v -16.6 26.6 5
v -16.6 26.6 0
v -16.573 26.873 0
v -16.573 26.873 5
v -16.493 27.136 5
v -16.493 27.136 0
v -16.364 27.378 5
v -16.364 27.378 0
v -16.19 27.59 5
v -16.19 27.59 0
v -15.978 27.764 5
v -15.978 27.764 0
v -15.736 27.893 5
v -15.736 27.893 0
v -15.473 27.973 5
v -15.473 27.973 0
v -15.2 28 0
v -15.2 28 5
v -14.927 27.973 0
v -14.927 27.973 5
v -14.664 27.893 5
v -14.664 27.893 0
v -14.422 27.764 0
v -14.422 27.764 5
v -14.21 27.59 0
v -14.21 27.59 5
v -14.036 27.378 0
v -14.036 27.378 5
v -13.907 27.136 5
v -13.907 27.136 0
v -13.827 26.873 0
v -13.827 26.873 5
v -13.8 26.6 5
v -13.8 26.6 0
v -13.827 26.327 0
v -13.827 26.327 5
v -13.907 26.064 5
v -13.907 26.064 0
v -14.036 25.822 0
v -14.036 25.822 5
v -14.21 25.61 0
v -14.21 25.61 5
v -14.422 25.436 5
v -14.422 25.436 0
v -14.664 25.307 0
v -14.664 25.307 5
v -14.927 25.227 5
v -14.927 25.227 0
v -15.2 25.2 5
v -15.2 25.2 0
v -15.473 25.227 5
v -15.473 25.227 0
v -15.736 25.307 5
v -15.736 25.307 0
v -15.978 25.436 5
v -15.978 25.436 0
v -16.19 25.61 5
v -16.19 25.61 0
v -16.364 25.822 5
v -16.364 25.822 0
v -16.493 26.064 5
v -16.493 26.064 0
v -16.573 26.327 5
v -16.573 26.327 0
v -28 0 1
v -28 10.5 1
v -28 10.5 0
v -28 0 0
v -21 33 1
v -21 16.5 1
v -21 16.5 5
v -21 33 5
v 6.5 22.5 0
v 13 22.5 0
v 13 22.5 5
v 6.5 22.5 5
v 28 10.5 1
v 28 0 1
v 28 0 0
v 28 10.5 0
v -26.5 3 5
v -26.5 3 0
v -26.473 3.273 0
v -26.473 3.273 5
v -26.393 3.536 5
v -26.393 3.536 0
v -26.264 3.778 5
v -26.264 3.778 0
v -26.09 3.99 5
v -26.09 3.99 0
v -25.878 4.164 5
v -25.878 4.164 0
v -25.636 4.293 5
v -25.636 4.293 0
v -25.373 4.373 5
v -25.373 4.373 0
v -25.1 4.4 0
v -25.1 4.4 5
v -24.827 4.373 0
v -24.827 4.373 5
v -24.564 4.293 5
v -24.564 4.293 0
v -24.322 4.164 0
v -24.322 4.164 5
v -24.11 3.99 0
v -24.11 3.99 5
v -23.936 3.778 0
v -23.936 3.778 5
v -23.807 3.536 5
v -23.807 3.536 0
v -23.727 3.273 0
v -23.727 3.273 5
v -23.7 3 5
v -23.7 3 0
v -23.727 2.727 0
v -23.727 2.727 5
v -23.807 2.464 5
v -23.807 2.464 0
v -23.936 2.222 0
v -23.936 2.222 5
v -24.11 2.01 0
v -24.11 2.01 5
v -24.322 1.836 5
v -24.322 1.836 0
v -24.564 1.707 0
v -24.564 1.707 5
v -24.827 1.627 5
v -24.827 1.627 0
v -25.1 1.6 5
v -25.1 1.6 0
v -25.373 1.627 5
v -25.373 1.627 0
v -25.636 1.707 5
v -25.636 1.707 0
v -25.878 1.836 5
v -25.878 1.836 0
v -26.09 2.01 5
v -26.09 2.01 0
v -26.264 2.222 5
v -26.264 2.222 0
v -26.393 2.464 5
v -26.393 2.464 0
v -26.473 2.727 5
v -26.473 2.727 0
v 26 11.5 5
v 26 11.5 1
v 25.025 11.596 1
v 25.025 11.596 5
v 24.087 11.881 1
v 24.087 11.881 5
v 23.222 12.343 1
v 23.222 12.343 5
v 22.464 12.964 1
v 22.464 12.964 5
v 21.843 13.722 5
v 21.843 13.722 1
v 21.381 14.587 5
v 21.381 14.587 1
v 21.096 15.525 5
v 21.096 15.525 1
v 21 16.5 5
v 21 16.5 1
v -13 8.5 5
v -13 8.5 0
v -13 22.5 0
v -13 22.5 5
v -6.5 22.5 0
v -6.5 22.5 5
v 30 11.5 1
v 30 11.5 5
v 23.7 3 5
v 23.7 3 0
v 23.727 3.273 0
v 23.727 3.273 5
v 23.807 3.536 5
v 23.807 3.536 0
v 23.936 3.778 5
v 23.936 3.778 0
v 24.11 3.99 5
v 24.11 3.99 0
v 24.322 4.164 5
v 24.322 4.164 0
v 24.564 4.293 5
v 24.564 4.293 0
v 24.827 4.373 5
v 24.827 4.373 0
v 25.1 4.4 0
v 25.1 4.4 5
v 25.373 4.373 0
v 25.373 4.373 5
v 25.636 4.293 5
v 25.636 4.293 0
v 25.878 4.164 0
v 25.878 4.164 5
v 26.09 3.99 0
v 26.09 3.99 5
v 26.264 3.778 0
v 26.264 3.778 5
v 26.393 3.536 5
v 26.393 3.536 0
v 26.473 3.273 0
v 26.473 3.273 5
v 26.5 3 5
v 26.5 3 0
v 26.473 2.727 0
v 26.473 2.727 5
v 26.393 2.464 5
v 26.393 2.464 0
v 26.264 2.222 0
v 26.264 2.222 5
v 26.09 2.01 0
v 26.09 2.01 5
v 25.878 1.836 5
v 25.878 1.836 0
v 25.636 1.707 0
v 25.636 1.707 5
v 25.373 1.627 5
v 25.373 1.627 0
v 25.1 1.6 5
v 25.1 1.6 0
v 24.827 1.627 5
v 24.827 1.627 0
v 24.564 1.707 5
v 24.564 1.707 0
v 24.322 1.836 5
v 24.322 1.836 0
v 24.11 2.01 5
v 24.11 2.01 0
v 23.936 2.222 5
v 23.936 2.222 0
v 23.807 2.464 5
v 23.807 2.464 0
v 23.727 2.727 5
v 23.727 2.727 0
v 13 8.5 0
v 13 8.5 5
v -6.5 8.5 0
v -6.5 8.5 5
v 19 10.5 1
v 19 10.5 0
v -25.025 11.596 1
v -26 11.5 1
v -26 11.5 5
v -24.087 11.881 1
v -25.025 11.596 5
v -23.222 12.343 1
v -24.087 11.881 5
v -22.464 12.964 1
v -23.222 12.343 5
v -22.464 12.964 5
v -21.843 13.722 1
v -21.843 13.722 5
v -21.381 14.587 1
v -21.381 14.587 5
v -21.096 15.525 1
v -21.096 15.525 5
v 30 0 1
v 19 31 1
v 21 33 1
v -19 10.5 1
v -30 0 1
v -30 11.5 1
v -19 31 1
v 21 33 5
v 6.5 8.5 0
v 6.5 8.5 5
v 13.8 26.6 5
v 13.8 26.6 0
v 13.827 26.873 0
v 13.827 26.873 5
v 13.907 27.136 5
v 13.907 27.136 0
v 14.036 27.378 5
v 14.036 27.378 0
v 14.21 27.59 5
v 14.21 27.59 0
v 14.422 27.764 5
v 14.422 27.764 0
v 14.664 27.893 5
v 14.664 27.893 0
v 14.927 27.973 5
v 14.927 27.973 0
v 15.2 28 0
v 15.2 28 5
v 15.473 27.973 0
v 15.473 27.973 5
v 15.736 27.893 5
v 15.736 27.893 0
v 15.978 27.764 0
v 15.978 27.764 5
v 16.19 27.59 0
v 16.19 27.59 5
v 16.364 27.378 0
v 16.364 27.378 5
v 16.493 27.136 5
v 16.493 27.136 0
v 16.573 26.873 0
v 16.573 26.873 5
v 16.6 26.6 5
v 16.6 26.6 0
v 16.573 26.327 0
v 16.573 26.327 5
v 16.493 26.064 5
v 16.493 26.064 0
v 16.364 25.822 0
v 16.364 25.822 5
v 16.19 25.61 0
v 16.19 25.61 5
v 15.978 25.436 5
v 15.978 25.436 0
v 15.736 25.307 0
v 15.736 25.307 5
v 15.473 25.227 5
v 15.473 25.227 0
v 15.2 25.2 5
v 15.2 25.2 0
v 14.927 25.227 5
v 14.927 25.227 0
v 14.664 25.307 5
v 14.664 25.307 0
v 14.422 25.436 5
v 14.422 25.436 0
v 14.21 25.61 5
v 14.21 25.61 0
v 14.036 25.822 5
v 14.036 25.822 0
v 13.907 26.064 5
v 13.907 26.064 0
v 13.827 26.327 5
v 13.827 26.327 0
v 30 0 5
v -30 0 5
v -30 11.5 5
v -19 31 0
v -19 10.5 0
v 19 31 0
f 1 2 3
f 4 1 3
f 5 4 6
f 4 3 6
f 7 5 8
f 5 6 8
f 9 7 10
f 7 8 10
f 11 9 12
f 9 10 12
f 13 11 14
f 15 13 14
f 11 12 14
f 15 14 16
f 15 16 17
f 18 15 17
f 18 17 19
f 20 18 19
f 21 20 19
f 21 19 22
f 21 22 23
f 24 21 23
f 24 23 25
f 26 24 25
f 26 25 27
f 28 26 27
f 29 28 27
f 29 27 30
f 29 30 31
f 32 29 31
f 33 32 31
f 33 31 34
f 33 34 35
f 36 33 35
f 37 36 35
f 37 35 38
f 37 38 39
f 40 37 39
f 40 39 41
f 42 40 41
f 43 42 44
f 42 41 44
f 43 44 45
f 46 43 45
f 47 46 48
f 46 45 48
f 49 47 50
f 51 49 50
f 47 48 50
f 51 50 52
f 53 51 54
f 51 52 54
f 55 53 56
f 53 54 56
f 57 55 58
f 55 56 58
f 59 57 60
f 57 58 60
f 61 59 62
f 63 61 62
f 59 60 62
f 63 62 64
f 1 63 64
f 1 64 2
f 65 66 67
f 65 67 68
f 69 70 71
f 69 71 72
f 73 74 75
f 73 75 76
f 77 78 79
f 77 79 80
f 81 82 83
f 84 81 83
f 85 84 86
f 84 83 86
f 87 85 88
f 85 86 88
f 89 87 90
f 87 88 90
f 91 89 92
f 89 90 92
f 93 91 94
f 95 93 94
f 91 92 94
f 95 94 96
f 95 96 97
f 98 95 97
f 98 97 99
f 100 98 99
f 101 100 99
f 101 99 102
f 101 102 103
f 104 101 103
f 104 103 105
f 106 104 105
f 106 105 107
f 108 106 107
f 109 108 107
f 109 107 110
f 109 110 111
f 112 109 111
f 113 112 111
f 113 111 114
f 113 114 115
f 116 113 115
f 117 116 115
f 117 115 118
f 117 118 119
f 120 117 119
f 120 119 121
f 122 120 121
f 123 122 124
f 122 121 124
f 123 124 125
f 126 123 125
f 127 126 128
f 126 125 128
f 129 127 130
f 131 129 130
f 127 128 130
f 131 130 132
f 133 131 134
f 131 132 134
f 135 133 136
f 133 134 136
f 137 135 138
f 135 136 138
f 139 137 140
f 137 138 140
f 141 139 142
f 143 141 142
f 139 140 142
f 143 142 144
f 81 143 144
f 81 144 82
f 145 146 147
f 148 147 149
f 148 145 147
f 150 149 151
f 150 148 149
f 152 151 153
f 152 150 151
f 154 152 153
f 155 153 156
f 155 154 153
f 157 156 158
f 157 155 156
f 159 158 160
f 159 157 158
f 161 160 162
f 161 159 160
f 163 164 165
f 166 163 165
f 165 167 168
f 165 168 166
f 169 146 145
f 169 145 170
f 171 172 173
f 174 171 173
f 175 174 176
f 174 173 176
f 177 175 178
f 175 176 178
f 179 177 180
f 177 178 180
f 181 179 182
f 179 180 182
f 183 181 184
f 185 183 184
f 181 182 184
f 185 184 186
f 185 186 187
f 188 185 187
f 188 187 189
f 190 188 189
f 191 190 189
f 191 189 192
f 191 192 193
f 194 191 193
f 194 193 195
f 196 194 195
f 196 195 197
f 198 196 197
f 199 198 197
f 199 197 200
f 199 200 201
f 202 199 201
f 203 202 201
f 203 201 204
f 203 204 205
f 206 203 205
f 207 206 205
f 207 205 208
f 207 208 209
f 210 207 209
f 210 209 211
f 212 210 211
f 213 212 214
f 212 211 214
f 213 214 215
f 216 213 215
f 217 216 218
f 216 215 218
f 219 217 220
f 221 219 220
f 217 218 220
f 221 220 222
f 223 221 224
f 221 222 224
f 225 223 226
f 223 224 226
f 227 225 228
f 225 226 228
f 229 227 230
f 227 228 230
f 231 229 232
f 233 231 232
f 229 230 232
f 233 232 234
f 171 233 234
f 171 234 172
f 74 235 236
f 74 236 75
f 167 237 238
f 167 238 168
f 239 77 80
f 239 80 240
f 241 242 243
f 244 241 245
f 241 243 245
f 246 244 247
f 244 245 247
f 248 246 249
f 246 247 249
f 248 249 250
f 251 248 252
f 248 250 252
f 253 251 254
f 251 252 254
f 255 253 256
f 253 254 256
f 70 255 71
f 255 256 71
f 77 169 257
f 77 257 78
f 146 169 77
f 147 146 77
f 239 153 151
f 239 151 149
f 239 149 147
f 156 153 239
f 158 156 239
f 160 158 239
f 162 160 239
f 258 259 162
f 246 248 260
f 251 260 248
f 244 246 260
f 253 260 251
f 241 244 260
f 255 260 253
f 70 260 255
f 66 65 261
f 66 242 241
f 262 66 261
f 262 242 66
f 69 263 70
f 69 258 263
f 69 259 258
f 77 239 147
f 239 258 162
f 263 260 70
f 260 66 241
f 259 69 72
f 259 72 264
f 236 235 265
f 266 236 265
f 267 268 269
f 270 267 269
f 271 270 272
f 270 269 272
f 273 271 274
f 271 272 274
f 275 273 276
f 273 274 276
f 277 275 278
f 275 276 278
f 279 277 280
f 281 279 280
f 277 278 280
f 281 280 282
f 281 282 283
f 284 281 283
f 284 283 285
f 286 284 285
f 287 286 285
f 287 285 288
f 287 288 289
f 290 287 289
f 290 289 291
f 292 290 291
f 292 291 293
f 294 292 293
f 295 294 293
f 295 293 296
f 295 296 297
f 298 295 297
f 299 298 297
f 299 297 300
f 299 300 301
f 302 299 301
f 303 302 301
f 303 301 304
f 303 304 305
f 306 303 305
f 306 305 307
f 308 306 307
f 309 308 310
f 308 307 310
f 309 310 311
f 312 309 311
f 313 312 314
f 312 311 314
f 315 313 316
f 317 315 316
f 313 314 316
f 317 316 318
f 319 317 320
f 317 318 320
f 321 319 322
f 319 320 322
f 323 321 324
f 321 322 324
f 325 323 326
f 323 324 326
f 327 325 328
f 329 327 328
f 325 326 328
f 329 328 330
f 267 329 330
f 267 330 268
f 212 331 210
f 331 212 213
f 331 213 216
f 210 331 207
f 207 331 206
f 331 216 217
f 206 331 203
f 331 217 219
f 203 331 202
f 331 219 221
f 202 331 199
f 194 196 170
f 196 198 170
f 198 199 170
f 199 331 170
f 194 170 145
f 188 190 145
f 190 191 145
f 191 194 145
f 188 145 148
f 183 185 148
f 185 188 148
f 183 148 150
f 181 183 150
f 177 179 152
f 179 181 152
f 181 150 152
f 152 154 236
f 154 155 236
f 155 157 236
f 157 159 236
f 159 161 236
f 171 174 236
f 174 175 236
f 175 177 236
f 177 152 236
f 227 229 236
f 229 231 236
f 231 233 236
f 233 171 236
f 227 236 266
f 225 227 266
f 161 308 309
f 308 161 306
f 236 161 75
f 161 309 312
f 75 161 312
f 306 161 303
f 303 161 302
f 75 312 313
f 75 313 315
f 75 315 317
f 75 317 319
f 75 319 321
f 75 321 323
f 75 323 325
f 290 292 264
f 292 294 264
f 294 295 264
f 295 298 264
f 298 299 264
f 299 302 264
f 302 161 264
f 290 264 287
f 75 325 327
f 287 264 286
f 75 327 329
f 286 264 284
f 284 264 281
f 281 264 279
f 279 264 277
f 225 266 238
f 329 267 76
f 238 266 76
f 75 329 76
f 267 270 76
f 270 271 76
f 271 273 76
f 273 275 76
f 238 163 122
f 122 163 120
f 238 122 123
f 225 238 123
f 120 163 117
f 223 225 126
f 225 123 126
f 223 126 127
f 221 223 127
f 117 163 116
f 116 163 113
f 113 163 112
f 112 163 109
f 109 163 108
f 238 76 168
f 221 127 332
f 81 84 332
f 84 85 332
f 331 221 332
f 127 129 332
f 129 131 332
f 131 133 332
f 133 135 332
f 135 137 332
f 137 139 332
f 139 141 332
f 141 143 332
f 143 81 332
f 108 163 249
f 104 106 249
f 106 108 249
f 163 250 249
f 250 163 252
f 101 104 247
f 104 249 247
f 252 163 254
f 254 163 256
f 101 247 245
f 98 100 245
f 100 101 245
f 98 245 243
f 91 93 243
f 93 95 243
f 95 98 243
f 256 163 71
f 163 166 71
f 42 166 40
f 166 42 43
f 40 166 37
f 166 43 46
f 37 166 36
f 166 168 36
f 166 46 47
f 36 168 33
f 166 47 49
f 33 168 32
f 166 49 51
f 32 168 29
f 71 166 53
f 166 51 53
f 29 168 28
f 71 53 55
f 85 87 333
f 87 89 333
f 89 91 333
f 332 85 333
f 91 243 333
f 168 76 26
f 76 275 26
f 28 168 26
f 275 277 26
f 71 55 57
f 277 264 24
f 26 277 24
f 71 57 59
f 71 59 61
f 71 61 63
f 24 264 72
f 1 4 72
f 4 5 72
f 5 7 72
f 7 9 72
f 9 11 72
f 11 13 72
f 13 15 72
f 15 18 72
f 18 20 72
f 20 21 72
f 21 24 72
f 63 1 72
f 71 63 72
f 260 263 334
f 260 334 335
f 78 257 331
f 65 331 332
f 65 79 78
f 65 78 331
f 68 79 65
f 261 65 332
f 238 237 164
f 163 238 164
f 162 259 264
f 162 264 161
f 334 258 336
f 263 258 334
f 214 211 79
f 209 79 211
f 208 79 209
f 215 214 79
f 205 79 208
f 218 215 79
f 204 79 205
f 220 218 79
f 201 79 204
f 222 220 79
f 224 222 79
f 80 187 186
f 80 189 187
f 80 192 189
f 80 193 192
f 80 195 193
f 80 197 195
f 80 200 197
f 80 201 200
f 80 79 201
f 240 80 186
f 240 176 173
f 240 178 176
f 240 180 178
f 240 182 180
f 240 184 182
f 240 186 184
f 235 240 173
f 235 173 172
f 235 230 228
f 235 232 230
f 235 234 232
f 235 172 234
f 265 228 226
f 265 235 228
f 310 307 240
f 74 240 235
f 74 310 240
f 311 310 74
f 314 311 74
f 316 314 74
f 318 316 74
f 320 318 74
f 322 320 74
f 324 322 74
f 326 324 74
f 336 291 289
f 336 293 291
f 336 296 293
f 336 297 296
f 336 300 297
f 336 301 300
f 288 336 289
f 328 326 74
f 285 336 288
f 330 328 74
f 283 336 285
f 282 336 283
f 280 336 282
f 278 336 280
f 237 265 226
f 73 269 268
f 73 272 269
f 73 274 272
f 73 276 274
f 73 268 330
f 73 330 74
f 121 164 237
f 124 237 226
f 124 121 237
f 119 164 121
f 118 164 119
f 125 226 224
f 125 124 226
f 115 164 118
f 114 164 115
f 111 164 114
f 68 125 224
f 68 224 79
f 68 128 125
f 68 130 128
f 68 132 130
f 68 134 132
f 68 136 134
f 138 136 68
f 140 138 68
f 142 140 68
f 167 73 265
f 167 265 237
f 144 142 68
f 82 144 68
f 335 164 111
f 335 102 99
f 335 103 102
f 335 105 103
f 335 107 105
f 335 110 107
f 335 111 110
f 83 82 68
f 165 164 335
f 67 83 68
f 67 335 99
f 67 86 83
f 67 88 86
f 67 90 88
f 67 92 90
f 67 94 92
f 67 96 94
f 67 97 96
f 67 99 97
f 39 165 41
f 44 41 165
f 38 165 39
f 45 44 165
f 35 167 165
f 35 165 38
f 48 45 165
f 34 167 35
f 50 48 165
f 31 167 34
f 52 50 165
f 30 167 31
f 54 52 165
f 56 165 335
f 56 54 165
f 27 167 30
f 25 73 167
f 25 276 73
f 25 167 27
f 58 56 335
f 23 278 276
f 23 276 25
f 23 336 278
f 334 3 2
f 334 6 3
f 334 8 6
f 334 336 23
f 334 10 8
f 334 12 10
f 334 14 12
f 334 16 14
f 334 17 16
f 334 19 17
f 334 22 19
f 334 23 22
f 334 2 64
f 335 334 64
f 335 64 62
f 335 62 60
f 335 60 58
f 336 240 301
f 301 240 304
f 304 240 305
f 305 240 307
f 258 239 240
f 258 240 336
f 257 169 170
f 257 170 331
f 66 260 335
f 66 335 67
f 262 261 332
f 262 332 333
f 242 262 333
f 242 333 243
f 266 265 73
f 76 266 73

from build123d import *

# Parameters (mm, degrees)
EXTRUDE_1_DEPTH     = 5
SKETCH_2_W          = 6.5
SKETCH_2_H          = 14
CUT_EXTRUDE_1_DEPTH = 5
SKETCH_3_R          = 1.4
CUT_EXTRUDE_2_DEPTH = 45.877611345
FILLET_1_R          = 5
CUT_EXTRUDE_START   = -1
CUT_EXTRUDE_5_DEPTH = 1


with BuildPart() as part:
    # 草图1 → 凸台-拉伸1 (new body)
    with BuildSketch(Plane.XY):
        Polygon((30, 0), (-30, 0), (-30, 11.5), (-21, 11.5), (-21, 33), (21, 33), (21, 11.5), (30, 11.5), align=None)
    extrude(amount=EXTRUDE_1_DEPTH)

    # 草图2 → 切除-拉伸1 (cut)
    with BuildSketch(Plane(origin=(0, 0, 0), x_dir=(-1, 0, 0), z_dir=(0, 0, -1))):
        with Locations((-9.75, 15.5)):
            Rectangle(SKETCH_2_W, SKETCH_2_H)
        with Locations((9.75, 15.5)):
            Rectangle(SKETCH_2_W, SKETCH_2_H)
    extrude(amount=-CUT_EXTRUDE_1_DEPTH, mode=Mode.SUBTRACT)

    # 草图3 → 切除-拉伸2 (cut, through all)
    with BuildSketch(Plane(origin=(0, 0, 0), x_dir=(-1, 0, 0), z_dir=(0, 0, -1))):
        with Locations((-25.1, 3)):
            Circle(SKETCH_3_R)
        with Locations((-15.2, 26.6)):
            Circle(SKETCH_3_R)
        with Locations((25.1, 3)):
            Circle(SKETCH_3_R)
        with Locations((15.2, 26.6)):
            Circle(SKETCH_3_R)
    extrude(amount=-CUT_EXTRUDE_2_DEPTH, mode=Mode.SUBTRACT)

    # 圆角1
    fillet_1_edges = [part.edges().sort_by_distance(p)[0] for p in [
        (-21, 11.5, 2.5),
        (21, 11.5, 2.5),
    ]]
    fillet(fillet_1_edges, radius=FILLET_1_R)

    # 草图5 → 切除-拉伸5 (cut)
    with BuildSketch(Plane(origin=(0, 0, 0), x_dir=(-1, 0, 0), z_dir=(0, 0, -1)).offset(CUT_EXTRUDE_START)):
        with BuildLine():
            Line((21, 33), (-21, 33))
            Line((-21, 33), (-21, 16.5))
            ThreePointArc((-21, 16.5), (-22.464466094, 12.964466094), (-26, 11.5))
            Line((-26, 11.5), (-30, 11.5))
            Line((-30, 11.5), (-30, 0))
            Line((-30, 0), (-28, 0))
            Line((-28, 0), (-28, 10.5))
            Line((-28, 10.5), (-19, 10.5))
            Line((-19, 10.5), (-19, 31))
            Line((-19, 31), (19, 31))
            Line((19, 31), (19, 10.5))
            Line((19, 10.5), (28, 10.5))
            Line((28, 10.5), (28, 0))
            Line((28, 0), (30, 0))
            Line((30, 0), (30, 11.5))
            Line((30, 11.5), (26, 11.5))
            ThreePointArc((26, 11.5), (22.464466094, 12.964466094), (21, 16.5))
            Line((21, 16.5), (21, 33))
        make_face()
    extrude(amount=CUT_EXTRUDE_5_DEPTH, mode=Mode.SUBTRACT)


solid = part.part
